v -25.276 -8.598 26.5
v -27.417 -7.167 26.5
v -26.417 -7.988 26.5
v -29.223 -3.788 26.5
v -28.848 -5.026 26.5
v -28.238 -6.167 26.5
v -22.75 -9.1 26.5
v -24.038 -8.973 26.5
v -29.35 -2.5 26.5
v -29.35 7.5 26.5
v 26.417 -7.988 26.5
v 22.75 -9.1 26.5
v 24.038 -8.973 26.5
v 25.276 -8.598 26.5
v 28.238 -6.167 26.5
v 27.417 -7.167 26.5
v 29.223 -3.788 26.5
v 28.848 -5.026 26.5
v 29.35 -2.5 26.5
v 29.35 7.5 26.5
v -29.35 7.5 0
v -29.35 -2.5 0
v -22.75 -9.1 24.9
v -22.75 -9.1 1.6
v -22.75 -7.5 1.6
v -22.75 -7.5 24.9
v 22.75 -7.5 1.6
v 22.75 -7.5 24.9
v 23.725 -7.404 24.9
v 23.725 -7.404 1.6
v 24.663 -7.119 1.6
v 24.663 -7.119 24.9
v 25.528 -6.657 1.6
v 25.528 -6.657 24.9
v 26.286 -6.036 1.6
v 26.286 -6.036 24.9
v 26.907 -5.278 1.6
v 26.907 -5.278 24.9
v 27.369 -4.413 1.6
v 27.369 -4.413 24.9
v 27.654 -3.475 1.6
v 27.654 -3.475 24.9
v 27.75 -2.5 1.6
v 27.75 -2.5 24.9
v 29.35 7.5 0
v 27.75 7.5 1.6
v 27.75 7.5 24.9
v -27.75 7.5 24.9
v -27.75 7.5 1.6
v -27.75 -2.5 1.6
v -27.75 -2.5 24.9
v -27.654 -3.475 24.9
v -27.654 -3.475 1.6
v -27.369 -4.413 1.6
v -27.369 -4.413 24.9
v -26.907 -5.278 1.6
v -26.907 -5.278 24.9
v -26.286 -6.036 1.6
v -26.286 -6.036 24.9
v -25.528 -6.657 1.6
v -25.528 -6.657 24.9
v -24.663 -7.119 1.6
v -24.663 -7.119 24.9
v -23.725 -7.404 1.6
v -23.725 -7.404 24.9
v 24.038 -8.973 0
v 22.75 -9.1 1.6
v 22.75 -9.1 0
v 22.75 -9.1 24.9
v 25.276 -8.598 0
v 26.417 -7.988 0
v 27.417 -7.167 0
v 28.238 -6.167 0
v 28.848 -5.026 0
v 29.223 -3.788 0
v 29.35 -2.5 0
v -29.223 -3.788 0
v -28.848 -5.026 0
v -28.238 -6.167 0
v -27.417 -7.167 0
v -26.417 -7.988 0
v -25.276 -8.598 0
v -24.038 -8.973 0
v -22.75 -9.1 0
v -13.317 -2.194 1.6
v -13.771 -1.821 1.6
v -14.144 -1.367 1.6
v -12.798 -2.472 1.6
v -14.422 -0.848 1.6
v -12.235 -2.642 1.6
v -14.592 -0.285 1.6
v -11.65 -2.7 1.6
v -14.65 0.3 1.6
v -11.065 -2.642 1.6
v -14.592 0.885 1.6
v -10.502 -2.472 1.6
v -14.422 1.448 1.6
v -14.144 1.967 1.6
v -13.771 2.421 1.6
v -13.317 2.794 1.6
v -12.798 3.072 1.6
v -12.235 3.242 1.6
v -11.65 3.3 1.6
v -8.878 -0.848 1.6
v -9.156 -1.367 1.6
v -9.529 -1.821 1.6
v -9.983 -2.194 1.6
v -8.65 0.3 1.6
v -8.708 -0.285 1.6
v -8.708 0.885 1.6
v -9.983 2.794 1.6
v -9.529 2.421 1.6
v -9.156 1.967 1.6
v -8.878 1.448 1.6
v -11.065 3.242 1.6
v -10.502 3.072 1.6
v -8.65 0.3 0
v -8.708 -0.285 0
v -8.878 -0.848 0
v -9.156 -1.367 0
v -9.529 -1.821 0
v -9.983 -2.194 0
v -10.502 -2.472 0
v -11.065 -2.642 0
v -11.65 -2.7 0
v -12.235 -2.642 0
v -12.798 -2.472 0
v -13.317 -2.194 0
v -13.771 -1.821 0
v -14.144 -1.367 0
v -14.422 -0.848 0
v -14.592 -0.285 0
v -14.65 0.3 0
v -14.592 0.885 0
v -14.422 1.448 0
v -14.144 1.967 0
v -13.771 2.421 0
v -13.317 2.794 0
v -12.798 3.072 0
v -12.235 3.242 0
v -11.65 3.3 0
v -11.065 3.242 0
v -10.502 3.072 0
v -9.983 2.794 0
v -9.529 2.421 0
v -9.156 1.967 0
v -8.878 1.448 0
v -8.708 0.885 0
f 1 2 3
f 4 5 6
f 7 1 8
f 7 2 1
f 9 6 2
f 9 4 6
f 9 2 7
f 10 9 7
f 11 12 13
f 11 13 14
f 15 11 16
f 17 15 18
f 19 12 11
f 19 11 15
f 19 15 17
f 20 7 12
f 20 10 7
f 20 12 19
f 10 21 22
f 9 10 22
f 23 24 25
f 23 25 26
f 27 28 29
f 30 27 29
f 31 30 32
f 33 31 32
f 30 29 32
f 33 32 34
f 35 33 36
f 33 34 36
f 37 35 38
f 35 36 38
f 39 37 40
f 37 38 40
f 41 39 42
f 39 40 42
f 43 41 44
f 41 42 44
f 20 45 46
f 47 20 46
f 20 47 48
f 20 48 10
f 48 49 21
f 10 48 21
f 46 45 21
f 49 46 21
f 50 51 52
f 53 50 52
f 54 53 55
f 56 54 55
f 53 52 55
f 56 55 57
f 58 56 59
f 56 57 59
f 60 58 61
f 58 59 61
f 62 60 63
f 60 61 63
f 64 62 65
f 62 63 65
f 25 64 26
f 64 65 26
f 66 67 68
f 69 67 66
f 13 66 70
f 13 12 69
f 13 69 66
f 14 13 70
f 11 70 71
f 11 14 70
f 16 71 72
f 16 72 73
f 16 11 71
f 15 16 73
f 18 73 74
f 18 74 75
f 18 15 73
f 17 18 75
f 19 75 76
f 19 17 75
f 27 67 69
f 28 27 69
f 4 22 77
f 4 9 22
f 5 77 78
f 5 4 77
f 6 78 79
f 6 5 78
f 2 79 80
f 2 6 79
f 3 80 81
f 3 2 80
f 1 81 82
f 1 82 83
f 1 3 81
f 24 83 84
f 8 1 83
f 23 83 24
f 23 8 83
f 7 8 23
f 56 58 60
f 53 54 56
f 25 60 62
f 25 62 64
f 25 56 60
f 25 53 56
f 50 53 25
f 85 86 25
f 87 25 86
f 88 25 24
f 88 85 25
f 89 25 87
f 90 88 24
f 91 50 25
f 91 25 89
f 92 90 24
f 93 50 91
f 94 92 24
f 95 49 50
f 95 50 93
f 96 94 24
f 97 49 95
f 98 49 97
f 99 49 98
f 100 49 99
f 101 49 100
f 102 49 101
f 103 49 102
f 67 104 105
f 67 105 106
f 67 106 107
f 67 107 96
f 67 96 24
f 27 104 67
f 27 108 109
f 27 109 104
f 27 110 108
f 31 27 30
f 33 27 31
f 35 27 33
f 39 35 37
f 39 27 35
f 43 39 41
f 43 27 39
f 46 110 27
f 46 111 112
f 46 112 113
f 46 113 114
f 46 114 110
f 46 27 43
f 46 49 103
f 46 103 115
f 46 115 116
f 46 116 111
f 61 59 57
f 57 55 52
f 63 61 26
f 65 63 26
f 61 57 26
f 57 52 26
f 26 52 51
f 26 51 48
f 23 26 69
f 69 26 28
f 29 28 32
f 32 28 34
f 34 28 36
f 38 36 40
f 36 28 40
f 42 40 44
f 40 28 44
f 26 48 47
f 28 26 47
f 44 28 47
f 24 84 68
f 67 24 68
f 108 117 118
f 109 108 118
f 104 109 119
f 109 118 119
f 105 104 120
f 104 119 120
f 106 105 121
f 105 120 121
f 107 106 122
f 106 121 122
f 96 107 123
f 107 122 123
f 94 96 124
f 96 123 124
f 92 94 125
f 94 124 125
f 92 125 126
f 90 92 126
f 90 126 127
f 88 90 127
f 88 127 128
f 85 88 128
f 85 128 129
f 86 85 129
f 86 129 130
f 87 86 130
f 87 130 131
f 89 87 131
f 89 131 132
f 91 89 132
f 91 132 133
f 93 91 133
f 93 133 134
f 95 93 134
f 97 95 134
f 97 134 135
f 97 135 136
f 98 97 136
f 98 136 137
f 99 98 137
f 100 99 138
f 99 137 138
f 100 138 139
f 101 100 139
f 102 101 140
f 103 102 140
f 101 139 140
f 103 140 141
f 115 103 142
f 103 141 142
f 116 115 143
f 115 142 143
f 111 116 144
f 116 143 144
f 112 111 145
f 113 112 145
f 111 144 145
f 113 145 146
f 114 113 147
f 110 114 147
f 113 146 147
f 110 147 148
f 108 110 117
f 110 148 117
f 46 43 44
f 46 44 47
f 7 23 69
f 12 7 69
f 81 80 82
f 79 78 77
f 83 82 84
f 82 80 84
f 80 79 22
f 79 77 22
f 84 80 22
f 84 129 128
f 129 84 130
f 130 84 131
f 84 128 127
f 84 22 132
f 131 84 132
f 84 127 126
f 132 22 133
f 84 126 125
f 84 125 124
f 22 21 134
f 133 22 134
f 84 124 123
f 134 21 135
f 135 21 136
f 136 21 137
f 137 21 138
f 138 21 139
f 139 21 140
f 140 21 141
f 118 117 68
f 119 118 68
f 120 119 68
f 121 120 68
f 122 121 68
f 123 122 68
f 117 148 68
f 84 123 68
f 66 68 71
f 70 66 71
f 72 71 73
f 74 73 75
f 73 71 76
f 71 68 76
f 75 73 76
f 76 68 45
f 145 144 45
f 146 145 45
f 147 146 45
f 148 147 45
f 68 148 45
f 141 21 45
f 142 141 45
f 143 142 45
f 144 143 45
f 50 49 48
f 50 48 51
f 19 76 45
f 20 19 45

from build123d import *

# Parameters (mm, degrees)
F1_DEPTH = 26.5
F2_R     = 6.6
F3_T     = -1.6
F4_R     = 3
F5_DEPTH = 2
F6_W     = 45.5
F6_H     = 23.3
F7_DEPTH = 2


with BuildPart() as f1:
    # F0 (on Top) → F1 (new body)
    with BuildSketch(Plane.XY):
        Polygon((29.25, 7.5), (27.65, 7.5), (-27.65, 7.5), (-29.25, 7.5), (-29.35, 7.5), (-29.35, -9.1), (-29.25, -9.1), (29.25, -9.1), (29.35, -9.1), (29.35, 7.5), align=None)
    extrude(amount=F1_DEPTH)

    # F2
    f2_edges = [f1.edges().sort_by_distance(p)[0] for p in [
        (-29.35, -9.1, 13.25),
        (29.35, -9.1, 13.25),
    ]]
    fillet(f2_edges, radius=F2_R)

    # F3
    f3_openings = [f1.faces().sort_by_distance(p)[0] for p in [
        (0, 7.5, 13.25),
    ]]
    offset(amount=F3_T, openings=f3_openings)

    # F4 (on face) → F5 (cut)
    with BuildSketch(Plane(origin=(0, 0, 0), x_dir=(1, 0, 0), z_dir=(0, 0, -1))):
        with Locations((-11.65, -0.3)):
            Circle(F4_R)
    extrude(amount=-F5_DEPTH, mode=Mode.SUBTRACT)

    # F6 (on face) → F7 (cut)
    with BuildSketch(Plane.XZ.offset(9.1)):
        with Locations((0, 13.25)):
            Rectangle(F6_W, F6_H)
    extrude(amount=-F7_DEPTH, mode=Mode.SUBTRACT)


solid = f1.part
